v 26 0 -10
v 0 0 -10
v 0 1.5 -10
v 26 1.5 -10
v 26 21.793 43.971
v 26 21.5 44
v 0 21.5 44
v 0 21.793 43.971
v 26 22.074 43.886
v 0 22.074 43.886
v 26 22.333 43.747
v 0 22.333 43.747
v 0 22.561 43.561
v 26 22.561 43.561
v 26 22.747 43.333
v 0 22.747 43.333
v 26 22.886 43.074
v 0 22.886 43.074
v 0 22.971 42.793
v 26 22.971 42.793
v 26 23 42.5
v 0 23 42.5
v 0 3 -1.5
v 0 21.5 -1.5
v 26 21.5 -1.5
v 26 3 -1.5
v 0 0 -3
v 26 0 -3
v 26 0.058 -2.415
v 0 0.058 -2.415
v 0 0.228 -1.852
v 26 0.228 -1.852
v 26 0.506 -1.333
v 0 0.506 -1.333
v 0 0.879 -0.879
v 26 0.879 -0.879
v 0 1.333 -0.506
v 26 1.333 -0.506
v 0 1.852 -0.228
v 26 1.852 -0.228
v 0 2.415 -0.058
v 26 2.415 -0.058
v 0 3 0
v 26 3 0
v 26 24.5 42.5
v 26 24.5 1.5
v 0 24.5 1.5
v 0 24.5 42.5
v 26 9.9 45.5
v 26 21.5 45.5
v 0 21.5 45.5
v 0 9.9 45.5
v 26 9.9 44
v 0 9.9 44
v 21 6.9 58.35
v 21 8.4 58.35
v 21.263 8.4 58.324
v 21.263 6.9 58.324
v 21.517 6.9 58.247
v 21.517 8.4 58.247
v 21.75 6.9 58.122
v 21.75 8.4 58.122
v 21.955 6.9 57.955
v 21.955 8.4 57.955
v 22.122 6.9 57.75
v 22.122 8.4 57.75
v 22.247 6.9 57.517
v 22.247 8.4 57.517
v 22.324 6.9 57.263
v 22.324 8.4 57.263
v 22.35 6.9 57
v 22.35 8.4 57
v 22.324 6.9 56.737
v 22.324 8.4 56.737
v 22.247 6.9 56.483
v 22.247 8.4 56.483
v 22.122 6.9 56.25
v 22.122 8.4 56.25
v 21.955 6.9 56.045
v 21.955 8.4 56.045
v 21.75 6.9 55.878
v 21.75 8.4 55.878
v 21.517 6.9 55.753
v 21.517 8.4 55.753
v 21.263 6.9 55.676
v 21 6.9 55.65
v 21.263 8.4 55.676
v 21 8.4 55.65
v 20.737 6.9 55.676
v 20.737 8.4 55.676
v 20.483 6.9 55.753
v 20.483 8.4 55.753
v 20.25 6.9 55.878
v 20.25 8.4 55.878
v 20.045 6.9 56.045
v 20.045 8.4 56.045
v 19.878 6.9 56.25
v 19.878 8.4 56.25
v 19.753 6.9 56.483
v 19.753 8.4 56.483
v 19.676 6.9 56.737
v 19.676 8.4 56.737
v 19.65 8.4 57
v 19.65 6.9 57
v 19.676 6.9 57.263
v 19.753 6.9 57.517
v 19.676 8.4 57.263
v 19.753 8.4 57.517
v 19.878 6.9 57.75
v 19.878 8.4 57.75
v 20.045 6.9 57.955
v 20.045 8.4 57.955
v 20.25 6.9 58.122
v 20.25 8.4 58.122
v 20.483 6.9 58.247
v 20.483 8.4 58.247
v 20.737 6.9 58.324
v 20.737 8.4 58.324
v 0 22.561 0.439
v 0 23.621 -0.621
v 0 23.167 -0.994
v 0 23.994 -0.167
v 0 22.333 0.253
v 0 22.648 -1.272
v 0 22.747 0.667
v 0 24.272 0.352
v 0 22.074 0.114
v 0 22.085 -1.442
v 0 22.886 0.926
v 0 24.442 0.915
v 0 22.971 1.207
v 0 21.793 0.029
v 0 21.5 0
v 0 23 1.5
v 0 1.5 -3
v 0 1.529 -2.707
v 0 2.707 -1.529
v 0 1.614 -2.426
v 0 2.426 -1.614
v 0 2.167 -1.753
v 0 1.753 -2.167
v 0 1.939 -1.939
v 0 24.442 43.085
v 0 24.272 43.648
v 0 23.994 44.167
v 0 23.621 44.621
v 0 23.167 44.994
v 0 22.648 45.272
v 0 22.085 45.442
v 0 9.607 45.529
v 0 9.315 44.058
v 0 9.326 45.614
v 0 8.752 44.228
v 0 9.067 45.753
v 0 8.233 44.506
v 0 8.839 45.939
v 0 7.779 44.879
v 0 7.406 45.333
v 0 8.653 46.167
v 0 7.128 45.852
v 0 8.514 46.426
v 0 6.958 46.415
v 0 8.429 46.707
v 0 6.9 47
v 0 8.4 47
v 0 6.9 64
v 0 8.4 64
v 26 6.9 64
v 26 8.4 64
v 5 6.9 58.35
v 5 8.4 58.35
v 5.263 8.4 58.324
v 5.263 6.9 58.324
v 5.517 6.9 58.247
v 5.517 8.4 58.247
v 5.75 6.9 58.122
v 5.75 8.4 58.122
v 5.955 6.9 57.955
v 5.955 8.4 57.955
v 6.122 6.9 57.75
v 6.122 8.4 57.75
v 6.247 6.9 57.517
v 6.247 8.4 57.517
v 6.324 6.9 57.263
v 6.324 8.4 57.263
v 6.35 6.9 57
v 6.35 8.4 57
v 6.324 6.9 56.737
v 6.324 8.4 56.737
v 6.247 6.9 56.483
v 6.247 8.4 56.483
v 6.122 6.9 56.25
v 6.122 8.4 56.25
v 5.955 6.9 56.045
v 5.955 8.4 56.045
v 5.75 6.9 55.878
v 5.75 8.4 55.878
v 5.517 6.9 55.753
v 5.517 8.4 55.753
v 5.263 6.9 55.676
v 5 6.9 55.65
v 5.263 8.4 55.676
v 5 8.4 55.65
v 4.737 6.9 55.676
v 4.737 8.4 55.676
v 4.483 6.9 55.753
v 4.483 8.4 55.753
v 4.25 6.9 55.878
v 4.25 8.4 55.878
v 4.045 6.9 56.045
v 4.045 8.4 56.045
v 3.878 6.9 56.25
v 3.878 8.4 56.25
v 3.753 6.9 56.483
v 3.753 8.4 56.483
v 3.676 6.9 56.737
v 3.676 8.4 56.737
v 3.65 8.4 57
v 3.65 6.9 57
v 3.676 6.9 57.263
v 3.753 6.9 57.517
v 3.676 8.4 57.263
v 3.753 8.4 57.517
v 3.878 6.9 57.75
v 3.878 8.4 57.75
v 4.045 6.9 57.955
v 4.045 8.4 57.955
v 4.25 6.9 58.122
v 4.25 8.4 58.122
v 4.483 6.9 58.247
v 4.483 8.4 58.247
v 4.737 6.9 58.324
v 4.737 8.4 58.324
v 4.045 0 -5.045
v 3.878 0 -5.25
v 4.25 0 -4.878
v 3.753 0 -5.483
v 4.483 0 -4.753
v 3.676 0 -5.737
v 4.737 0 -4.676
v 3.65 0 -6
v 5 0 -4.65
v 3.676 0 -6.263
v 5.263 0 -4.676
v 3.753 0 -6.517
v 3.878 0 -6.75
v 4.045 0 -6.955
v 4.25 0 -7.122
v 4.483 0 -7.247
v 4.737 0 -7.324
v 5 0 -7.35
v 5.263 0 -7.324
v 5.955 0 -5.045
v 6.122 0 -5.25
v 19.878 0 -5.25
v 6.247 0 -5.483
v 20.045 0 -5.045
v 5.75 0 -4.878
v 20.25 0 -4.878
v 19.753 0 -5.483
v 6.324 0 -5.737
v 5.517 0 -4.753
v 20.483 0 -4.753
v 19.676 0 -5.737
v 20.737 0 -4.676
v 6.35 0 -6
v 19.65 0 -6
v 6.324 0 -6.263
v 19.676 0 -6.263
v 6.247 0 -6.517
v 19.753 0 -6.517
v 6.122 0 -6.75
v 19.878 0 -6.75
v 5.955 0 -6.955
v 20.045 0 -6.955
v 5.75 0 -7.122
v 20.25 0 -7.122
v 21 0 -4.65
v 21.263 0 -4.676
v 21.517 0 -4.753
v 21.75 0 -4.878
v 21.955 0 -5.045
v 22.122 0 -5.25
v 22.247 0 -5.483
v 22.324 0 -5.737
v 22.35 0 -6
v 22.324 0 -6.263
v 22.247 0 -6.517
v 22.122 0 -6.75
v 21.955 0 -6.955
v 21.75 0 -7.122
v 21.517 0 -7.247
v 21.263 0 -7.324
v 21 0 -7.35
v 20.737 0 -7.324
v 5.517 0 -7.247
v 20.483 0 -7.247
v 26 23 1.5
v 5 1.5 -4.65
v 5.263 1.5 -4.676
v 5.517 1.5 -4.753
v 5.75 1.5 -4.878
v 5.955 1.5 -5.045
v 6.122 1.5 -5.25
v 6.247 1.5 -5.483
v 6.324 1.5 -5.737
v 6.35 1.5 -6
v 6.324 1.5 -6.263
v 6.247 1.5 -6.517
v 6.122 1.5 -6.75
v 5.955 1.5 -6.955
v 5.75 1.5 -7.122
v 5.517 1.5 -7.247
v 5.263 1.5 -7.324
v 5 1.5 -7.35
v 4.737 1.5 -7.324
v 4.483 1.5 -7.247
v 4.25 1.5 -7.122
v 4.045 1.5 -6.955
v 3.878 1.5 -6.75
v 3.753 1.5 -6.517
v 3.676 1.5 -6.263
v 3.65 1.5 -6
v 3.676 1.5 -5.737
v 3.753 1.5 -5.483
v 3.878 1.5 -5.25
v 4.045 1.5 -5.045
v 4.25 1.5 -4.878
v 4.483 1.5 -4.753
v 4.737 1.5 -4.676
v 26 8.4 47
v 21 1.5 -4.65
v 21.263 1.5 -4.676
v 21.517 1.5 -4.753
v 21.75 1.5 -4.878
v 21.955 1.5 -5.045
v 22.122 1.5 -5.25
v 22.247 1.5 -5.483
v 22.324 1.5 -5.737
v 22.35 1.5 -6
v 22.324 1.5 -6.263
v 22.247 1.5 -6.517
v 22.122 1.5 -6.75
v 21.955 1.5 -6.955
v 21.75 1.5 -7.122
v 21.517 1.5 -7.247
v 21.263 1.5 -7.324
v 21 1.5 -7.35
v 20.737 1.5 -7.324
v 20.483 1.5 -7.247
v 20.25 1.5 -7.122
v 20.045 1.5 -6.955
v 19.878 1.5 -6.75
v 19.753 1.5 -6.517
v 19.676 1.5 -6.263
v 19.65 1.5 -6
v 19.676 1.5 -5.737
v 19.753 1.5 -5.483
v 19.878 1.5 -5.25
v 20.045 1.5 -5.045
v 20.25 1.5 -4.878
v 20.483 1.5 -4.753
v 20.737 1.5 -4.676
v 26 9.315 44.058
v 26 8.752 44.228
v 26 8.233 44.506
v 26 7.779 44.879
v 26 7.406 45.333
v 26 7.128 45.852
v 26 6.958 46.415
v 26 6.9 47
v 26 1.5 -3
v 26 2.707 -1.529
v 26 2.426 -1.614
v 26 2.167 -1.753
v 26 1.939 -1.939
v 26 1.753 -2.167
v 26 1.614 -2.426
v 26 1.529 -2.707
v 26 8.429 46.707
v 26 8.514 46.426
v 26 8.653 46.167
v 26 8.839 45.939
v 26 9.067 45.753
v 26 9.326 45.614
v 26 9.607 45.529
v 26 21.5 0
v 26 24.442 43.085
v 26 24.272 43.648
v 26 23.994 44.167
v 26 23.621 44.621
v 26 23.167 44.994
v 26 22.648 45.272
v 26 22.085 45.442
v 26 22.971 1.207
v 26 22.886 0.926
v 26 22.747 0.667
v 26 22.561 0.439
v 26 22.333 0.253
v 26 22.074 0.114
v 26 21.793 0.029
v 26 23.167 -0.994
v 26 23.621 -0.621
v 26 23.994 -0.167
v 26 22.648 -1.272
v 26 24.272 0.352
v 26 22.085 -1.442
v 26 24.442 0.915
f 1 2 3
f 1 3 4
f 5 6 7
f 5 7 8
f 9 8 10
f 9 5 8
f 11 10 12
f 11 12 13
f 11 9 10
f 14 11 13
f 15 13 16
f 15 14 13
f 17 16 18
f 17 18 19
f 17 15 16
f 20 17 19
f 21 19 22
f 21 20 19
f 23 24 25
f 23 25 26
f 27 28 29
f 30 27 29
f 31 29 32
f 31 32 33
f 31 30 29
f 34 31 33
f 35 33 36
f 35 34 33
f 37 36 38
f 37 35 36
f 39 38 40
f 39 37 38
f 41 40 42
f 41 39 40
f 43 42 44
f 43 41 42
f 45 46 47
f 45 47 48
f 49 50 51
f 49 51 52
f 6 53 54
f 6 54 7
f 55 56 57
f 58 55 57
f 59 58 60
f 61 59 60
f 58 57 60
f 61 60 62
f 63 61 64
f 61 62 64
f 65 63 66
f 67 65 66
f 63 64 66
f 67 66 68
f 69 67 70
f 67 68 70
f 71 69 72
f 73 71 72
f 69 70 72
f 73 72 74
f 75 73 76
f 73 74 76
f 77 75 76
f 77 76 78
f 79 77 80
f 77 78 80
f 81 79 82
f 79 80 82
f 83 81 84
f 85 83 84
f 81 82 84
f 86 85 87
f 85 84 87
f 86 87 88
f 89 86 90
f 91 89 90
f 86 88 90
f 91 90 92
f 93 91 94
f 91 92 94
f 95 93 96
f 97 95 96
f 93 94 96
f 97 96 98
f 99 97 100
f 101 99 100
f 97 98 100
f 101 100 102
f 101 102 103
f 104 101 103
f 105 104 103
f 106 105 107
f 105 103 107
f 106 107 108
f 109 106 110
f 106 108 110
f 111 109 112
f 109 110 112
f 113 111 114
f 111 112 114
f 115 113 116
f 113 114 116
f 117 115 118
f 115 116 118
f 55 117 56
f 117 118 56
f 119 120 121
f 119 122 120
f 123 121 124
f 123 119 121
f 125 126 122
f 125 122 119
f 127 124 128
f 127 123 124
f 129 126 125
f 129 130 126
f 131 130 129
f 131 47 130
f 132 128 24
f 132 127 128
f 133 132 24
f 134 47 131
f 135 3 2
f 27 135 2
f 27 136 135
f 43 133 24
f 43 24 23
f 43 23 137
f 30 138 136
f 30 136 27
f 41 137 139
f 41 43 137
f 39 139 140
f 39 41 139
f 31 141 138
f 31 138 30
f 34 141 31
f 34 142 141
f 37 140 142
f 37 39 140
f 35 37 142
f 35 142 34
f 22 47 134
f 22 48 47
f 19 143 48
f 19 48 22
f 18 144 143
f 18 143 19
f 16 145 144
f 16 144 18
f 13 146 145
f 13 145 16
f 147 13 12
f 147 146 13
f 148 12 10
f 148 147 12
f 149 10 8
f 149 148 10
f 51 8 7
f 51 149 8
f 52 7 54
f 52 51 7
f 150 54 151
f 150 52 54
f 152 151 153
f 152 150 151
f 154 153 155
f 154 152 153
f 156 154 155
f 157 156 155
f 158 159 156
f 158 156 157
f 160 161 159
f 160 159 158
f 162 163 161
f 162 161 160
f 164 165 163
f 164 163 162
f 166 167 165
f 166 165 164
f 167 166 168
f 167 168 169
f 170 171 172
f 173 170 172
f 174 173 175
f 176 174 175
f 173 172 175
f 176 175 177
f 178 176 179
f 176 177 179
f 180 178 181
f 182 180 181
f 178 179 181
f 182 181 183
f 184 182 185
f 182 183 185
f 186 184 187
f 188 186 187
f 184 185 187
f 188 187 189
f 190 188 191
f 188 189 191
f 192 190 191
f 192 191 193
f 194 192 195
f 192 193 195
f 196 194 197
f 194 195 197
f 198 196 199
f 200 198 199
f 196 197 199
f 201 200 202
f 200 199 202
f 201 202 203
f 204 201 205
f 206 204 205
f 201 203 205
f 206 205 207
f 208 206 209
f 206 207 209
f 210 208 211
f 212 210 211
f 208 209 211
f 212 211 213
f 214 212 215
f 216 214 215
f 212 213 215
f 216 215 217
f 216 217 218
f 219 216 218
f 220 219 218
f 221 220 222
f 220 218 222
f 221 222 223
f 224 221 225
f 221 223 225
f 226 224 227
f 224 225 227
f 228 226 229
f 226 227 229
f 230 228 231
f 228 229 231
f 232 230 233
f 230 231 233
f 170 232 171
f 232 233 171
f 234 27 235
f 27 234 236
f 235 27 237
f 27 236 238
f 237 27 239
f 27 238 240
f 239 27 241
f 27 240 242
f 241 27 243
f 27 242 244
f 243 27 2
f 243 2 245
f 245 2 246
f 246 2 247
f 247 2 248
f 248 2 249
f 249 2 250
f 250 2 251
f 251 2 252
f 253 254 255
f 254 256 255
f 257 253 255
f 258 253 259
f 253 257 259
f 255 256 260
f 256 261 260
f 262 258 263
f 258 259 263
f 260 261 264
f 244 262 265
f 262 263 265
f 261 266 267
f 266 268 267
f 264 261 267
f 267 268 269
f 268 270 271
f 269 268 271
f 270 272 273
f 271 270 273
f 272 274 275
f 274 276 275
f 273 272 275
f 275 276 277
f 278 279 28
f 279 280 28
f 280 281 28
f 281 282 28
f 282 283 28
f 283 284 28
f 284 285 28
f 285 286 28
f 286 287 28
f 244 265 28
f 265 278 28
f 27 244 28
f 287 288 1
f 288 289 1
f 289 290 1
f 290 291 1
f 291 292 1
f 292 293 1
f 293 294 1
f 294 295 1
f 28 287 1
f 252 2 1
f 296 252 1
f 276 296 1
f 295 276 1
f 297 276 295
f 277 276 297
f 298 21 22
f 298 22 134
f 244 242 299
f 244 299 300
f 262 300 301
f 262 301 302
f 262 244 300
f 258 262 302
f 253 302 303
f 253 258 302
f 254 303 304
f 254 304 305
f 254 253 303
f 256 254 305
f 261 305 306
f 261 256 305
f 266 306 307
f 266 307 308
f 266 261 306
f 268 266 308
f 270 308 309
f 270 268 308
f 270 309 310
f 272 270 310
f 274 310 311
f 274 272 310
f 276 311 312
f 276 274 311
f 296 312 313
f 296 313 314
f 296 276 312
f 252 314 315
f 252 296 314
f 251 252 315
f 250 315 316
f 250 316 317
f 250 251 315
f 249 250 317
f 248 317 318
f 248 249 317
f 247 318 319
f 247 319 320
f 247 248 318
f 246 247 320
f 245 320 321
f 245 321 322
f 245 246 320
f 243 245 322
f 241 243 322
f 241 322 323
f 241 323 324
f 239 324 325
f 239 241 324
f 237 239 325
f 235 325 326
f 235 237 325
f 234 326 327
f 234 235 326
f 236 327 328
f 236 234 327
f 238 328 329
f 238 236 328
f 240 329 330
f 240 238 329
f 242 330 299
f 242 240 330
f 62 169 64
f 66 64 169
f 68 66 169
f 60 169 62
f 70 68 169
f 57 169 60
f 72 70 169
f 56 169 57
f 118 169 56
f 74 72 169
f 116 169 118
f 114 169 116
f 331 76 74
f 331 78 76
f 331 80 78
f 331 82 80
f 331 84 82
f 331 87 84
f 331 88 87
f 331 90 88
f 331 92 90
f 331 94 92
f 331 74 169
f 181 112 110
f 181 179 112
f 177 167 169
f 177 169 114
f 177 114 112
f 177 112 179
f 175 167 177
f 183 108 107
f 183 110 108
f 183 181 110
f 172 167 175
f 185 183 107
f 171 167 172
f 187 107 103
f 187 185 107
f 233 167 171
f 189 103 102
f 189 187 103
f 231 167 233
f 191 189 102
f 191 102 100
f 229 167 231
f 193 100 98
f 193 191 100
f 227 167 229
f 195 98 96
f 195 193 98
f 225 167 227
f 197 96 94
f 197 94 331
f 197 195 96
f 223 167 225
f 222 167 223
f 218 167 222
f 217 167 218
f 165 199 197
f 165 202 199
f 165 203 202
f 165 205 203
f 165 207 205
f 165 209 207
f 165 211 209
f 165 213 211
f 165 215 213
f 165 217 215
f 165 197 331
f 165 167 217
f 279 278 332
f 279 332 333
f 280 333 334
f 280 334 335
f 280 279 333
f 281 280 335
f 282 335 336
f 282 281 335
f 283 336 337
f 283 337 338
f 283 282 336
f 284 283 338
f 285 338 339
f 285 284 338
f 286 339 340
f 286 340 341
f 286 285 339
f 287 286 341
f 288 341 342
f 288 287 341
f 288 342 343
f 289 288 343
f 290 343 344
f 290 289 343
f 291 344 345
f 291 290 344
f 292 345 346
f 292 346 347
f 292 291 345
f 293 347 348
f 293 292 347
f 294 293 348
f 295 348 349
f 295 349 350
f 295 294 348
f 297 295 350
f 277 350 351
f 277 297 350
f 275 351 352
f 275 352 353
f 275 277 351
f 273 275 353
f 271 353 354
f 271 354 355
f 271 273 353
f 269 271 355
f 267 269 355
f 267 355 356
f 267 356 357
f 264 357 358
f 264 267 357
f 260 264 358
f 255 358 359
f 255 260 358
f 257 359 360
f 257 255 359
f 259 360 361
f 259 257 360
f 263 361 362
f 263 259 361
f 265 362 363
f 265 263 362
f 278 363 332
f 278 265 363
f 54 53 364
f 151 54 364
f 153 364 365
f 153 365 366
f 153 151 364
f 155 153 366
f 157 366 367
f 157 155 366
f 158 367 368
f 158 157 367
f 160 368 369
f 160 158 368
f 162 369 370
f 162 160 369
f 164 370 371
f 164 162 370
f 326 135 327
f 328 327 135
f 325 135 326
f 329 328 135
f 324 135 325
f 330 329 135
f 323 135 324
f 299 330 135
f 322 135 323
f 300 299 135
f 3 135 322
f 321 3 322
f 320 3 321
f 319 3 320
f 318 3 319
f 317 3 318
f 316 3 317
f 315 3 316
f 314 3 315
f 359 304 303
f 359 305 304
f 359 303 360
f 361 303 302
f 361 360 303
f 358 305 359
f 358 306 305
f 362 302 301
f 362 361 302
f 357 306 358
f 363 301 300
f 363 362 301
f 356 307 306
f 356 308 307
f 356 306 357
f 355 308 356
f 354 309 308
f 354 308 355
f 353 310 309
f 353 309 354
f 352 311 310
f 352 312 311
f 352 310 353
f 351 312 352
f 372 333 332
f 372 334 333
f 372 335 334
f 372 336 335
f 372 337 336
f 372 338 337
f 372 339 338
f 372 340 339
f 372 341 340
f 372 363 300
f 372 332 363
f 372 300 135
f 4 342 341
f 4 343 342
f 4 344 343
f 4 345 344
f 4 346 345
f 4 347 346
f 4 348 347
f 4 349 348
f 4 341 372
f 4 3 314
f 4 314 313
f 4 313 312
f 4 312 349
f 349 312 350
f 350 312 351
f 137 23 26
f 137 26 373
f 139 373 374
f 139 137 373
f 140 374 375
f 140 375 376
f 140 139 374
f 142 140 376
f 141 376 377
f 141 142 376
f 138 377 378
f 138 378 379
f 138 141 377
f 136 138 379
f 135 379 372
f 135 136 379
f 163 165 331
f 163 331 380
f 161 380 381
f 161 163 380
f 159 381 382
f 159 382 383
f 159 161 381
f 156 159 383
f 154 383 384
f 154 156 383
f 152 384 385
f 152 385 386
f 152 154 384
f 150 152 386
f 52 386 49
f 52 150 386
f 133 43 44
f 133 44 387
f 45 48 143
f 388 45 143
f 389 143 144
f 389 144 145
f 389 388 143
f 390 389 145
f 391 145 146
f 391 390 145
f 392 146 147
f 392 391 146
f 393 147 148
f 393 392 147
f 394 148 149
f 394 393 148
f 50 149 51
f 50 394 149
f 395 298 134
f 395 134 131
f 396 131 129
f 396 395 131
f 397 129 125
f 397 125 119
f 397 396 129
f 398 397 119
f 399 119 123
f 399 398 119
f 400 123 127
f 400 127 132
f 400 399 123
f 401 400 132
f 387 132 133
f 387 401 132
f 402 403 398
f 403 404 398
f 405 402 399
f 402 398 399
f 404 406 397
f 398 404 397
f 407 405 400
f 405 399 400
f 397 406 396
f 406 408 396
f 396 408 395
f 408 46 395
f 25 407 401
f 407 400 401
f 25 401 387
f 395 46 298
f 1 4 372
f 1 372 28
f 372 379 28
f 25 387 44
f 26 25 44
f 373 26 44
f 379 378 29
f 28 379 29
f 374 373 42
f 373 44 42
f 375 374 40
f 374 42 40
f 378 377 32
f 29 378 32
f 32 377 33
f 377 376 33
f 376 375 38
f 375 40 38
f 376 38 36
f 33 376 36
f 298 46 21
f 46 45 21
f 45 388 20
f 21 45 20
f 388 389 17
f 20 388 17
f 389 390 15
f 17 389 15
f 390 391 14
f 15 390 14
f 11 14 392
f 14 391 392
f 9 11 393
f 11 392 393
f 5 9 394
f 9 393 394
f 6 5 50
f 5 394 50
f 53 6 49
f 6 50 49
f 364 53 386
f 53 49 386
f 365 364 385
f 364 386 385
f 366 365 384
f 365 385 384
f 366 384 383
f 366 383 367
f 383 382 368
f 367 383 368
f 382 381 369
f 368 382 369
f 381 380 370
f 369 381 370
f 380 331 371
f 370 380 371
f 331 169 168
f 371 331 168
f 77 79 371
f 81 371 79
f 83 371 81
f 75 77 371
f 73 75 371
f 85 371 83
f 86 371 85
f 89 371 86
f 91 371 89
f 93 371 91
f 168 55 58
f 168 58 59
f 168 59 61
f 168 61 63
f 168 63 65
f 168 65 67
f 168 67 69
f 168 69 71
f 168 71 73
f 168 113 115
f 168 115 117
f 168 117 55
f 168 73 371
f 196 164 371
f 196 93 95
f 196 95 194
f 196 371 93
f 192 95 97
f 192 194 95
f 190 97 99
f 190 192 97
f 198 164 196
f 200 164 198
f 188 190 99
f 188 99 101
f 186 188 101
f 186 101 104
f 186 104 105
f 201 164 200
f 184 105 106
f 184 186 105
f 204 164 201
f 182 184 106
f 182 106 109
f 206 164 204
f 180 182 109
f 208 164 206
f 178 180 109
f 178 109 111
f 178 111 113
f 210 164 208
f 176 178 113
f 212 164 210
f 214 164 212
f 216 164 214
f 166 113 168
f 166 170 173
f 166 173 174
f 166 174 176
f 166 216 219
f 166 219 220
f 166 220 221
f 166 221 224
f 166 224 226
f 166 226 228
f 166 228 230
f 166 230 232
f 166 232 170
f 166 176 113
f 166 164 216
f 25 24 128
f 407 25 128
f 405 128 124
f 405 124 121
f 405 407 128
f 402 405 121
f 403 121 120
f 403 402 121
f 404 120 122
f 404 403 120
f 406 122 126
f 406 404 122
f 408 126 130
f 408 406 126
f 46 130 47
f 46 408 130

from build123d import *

# Parameters (mm, degrees)
SKETCH_1_W                       = 26
SKETCH_1_H                       = 10
SKETCH_1_R                       = 1.35
EXTRUDE_1_DEPTH                  = 1.5
SM_EDGE_FLANGE_1_STRIP_W         = 9
SM_EDGE_FLANGE_1_STRIP_H         = 1.5
SM_EDGE_FLANGE_1_STRIP_CUT_DEPTH = 26
SM_EDGE_FLANGE_1_DEPTH           = 26
SM_EDGE_FLANGE_2_STRIP_W         = 9
SM_EDGE_FLANGE_2_STRIP_H         = 1.5
SM_EDGE_FLANGE_2_STRIP_CUT_DEPTH = 26
SM_EDGE_FLANGE_2_DEPTH           = 26
SM_EDGE_FLANGE_3_STRIP_W         = 9
SM_EDGE_FLANGE_3_STRIP_H         = 1.5
SM_EDGE_FLANGE_3_STRIP_CUT_DEPTH = 26
SM_EDGE_FLANGE_3_DEPTH           = 26
SM_EDGE_FLANGE_4_STRIP_W         = 9
SM_EDGE_FLANGE_4_STRIP_H         = 1.5
SM_EDGE_FLANGE_4_STRIP_CUT_DEPTH = 26
SM_EDGE_FLANGE_4_DEPTH           = 26
SKETCH_22_R                      = 1.35
CUT_EXTRUDE_1_DEPTH              = 1.5


# Sheet-metal steps are written as plain solids
with BuildPart() as part:
    # Sketch 1 → Бобышка-Вытянуть1 (new body)
    with BuildSketch(Plane(origin=(0, 0, 0), x_dir=(1, 0, 0), z_dir=(0, 1, 0))):
        with Locations((13, 5)):
            Rectangle(SKETCH_1_W, SKETCH_1_H)
        with Locations(Location((5, 6, 0), (0, 0, 270))):
            Circle(SKETCH_1_R, mode=Mode.SUBTRACT)
        with Locations(Location((21, 6, 0), (0, 0, 270))):
            Circle(SKETCH_1_R, mode=Mode.SUBTRACT)
    extrude(amount=EXTRUDE_1_DEPTH)

    # Ребро-кромка1 strip (across the edge) → Ребро-кромка1 strip cut (cut)
    with BuildSketch(Plane(origin=(0, 1.5, 0), x_dir=(0, 0, -1), z_dir=(1, 0, 0))):
        with Locations((-1.5, -0.75)):
            Rectangle(SM_EDGE_FLANGE_1_STRIP_W, SM_EDGE_FLANGE_1_STRIP_H)
    extrude(amount=SM_EDGE_FLANGE_1_STRIP_CUT_DEPTH, mode=Mode.SUBTRACT)

    # Ребро-кромка1 section (across the edge) → Ребро-кромка1 (add)
    with BuildSketch(Plane(origin=(0, 1.5, 0), x_dir=(0, 0, -1), z_dir=(1, 0, 0))):
        with BuildLine():
            Line((0, 1.5), (0, 23))
            Line((0, 23), (1.5, 23))
            Line((1.5, 23), (1.5, 1.5))
            ThreePointArc((1.5, 1.5), (1.939339828, 0.439339828), (3, 0))
            Line((3, 0), (3, -1.5))
            ThreePointArc((3, -1.5), (0.878679656, -0.621320344), (0, 1.5))
        make_face()
    extrude(amount=SM_EDGE_FLANGE_1_DEPTH)

    # Ребро-кромка2 strip (across the edge) → Ребро-кромка2 strip cut (cut)
    with BuildSketch(Plane(origin=(26, 24.5, 0), x_dir=(0, -1, 0), z_dir=(-1, 0, 0))):
        with Locations((-1.5, -0.75)):
            Rectangle(SM_EDGE_FLANGE_2_STRIP_W, SM_EDGE_FLANGE_2_STRIP_H)
    extrude(amount=SM_EDGE_FLANGE_2_STRIP_CUT_DEPTH, mode=Mode.SUBTRACT)

    # Ребро-кромка2 section (across the edge) → Ребро-кромка2 (add)
    with BuildSketch(Plane(origin=(26, 24.5, 0), x_dir=(0, -1, 0), z_dir=(-1, 0, 0))):
        with BuildLine():
            Line((0, 1.5), (0, 45.5))
            Line((0, 45.5), (1.5, 45.5))
            Line((1.5, 45.5), (1.5, 1.5))
            ThreePointArc((1.5, 1.5), (1.939339828, 0.439339828), (3, 0))
            Line((3, 0), (3, -1.5))
            ThreePointArc((3, -1.5), (0.878679656, -0.621320344), (0, 1.5))
        make_face()
    extrude(amount=SM_EDGE_FLANGE_2_DEPTH)

    # Ребро-кромка3 strip (across the edge) → Ребро-кромка3 strip cut (cut)
    with BuildSketch(Plane(origin=(26, 23, 45.5), x_dir=(0, 0, -1), z_dir=(-1, 0, 0))):
        with Locations((-1.5, -0.75)):
            Rectangle(SM_EDGE_FLANGE_3_STRIP_W, SM_EDGE_FLANGE_3_STRIP_H)
    extrude(amount=SM_EDGE_FLANGE_3_STRIP_CUT_DEPTH, mode=Mode.SUBTRACT)

    # Ребро-кромка3 section (across the edge) → Ребро-кромка3 (add)
    with BuildSketch(Plane(origin=(26, 23, 45.5), x_dir=(0, 0, -1), z_dir=(-1, 0, 0))):
        with BuildLine():
            Line((0, 1.5), (0, 16.1))
            Line((0, 16.1), (1.5, 16.1))
            Line((1.5, 16.1), (1.5, 1.5))
            ThreePointArc((1.5, 1.5), (1.939339828, 0.439339828), (3, 0))
            Line((3, 0), (3, -1.5))
            ThreePointArc((3, -1.5), (0.878679656, -0.621320344), (0, 1.5))
        make_face()
    extrude(amount=SM_EDGE_FLANGE_3_DEPTH)

    # Ребро-кромка4 strip (across the edge) → Ребро-кромка4 strip cut (cut)
    with BuildSketch(Plane(origin=(0, 6.9, 45.5), x_dir=(0, 1, 0), z_dir=(1, 0, 0))):
        with Locations((-1.5, -0.75)):
            Rectangle(SM_EDGE_FLANGE_4_STRIP_W, SM_EDGE_FLANGE_4_STRIP_H)
    extrude(amount=SM_EDGE_FLANGE_4_STRIP_CUT_DEPTH, mode=Mode.SUBTRACT)

    # Ребро-кромка4 section (across the edge) → Ребро-кромка4 (add)
    with BuildSketch(Plane(origin=(0, 6.9, 45.5), x_dir=(0, 1, 0), z_dir=(1, 0, 0))):
        with BuildLine():
            Line((0, 1.5), (0, 18.5))
            Line((0, 18.5), (1.5, 18.5))
            Line((1.5, 18.5), (1.5, 1.5))
            ThreePointArc((1.5, 1.5), (1.939339828, 0.439339828), (3, 0))
            Line((3, 0), (3, -1.5))
            ThreePointArc((3, -1.5), (0.878679656, -0.621320344), (0, 1.5))
        make_face()
    extrude(amount=SM_EDGE_FLANGE_4_DEPTH)

    # Эскиз22 → Вырез-Вытянуть1 (cut)
    with BuildSketch(Plane(origin=(0, 8.4, 0), x_dir=(1, 0, 0), z_dir=(0, 1, 0))):
        with Locations(Location((5, -57, 0), (0, 0, 270))):
            Circle(SKETCH_22_R)
        with Locations(Location((21, -57, 0), (0, 0, 270))):
            Circle(SKETCH_22_R)
    extrude(amount=-CUT_EXTRUDE_1_DEPTH, mode=Mode.SUBTRACT)


solid = part.part
